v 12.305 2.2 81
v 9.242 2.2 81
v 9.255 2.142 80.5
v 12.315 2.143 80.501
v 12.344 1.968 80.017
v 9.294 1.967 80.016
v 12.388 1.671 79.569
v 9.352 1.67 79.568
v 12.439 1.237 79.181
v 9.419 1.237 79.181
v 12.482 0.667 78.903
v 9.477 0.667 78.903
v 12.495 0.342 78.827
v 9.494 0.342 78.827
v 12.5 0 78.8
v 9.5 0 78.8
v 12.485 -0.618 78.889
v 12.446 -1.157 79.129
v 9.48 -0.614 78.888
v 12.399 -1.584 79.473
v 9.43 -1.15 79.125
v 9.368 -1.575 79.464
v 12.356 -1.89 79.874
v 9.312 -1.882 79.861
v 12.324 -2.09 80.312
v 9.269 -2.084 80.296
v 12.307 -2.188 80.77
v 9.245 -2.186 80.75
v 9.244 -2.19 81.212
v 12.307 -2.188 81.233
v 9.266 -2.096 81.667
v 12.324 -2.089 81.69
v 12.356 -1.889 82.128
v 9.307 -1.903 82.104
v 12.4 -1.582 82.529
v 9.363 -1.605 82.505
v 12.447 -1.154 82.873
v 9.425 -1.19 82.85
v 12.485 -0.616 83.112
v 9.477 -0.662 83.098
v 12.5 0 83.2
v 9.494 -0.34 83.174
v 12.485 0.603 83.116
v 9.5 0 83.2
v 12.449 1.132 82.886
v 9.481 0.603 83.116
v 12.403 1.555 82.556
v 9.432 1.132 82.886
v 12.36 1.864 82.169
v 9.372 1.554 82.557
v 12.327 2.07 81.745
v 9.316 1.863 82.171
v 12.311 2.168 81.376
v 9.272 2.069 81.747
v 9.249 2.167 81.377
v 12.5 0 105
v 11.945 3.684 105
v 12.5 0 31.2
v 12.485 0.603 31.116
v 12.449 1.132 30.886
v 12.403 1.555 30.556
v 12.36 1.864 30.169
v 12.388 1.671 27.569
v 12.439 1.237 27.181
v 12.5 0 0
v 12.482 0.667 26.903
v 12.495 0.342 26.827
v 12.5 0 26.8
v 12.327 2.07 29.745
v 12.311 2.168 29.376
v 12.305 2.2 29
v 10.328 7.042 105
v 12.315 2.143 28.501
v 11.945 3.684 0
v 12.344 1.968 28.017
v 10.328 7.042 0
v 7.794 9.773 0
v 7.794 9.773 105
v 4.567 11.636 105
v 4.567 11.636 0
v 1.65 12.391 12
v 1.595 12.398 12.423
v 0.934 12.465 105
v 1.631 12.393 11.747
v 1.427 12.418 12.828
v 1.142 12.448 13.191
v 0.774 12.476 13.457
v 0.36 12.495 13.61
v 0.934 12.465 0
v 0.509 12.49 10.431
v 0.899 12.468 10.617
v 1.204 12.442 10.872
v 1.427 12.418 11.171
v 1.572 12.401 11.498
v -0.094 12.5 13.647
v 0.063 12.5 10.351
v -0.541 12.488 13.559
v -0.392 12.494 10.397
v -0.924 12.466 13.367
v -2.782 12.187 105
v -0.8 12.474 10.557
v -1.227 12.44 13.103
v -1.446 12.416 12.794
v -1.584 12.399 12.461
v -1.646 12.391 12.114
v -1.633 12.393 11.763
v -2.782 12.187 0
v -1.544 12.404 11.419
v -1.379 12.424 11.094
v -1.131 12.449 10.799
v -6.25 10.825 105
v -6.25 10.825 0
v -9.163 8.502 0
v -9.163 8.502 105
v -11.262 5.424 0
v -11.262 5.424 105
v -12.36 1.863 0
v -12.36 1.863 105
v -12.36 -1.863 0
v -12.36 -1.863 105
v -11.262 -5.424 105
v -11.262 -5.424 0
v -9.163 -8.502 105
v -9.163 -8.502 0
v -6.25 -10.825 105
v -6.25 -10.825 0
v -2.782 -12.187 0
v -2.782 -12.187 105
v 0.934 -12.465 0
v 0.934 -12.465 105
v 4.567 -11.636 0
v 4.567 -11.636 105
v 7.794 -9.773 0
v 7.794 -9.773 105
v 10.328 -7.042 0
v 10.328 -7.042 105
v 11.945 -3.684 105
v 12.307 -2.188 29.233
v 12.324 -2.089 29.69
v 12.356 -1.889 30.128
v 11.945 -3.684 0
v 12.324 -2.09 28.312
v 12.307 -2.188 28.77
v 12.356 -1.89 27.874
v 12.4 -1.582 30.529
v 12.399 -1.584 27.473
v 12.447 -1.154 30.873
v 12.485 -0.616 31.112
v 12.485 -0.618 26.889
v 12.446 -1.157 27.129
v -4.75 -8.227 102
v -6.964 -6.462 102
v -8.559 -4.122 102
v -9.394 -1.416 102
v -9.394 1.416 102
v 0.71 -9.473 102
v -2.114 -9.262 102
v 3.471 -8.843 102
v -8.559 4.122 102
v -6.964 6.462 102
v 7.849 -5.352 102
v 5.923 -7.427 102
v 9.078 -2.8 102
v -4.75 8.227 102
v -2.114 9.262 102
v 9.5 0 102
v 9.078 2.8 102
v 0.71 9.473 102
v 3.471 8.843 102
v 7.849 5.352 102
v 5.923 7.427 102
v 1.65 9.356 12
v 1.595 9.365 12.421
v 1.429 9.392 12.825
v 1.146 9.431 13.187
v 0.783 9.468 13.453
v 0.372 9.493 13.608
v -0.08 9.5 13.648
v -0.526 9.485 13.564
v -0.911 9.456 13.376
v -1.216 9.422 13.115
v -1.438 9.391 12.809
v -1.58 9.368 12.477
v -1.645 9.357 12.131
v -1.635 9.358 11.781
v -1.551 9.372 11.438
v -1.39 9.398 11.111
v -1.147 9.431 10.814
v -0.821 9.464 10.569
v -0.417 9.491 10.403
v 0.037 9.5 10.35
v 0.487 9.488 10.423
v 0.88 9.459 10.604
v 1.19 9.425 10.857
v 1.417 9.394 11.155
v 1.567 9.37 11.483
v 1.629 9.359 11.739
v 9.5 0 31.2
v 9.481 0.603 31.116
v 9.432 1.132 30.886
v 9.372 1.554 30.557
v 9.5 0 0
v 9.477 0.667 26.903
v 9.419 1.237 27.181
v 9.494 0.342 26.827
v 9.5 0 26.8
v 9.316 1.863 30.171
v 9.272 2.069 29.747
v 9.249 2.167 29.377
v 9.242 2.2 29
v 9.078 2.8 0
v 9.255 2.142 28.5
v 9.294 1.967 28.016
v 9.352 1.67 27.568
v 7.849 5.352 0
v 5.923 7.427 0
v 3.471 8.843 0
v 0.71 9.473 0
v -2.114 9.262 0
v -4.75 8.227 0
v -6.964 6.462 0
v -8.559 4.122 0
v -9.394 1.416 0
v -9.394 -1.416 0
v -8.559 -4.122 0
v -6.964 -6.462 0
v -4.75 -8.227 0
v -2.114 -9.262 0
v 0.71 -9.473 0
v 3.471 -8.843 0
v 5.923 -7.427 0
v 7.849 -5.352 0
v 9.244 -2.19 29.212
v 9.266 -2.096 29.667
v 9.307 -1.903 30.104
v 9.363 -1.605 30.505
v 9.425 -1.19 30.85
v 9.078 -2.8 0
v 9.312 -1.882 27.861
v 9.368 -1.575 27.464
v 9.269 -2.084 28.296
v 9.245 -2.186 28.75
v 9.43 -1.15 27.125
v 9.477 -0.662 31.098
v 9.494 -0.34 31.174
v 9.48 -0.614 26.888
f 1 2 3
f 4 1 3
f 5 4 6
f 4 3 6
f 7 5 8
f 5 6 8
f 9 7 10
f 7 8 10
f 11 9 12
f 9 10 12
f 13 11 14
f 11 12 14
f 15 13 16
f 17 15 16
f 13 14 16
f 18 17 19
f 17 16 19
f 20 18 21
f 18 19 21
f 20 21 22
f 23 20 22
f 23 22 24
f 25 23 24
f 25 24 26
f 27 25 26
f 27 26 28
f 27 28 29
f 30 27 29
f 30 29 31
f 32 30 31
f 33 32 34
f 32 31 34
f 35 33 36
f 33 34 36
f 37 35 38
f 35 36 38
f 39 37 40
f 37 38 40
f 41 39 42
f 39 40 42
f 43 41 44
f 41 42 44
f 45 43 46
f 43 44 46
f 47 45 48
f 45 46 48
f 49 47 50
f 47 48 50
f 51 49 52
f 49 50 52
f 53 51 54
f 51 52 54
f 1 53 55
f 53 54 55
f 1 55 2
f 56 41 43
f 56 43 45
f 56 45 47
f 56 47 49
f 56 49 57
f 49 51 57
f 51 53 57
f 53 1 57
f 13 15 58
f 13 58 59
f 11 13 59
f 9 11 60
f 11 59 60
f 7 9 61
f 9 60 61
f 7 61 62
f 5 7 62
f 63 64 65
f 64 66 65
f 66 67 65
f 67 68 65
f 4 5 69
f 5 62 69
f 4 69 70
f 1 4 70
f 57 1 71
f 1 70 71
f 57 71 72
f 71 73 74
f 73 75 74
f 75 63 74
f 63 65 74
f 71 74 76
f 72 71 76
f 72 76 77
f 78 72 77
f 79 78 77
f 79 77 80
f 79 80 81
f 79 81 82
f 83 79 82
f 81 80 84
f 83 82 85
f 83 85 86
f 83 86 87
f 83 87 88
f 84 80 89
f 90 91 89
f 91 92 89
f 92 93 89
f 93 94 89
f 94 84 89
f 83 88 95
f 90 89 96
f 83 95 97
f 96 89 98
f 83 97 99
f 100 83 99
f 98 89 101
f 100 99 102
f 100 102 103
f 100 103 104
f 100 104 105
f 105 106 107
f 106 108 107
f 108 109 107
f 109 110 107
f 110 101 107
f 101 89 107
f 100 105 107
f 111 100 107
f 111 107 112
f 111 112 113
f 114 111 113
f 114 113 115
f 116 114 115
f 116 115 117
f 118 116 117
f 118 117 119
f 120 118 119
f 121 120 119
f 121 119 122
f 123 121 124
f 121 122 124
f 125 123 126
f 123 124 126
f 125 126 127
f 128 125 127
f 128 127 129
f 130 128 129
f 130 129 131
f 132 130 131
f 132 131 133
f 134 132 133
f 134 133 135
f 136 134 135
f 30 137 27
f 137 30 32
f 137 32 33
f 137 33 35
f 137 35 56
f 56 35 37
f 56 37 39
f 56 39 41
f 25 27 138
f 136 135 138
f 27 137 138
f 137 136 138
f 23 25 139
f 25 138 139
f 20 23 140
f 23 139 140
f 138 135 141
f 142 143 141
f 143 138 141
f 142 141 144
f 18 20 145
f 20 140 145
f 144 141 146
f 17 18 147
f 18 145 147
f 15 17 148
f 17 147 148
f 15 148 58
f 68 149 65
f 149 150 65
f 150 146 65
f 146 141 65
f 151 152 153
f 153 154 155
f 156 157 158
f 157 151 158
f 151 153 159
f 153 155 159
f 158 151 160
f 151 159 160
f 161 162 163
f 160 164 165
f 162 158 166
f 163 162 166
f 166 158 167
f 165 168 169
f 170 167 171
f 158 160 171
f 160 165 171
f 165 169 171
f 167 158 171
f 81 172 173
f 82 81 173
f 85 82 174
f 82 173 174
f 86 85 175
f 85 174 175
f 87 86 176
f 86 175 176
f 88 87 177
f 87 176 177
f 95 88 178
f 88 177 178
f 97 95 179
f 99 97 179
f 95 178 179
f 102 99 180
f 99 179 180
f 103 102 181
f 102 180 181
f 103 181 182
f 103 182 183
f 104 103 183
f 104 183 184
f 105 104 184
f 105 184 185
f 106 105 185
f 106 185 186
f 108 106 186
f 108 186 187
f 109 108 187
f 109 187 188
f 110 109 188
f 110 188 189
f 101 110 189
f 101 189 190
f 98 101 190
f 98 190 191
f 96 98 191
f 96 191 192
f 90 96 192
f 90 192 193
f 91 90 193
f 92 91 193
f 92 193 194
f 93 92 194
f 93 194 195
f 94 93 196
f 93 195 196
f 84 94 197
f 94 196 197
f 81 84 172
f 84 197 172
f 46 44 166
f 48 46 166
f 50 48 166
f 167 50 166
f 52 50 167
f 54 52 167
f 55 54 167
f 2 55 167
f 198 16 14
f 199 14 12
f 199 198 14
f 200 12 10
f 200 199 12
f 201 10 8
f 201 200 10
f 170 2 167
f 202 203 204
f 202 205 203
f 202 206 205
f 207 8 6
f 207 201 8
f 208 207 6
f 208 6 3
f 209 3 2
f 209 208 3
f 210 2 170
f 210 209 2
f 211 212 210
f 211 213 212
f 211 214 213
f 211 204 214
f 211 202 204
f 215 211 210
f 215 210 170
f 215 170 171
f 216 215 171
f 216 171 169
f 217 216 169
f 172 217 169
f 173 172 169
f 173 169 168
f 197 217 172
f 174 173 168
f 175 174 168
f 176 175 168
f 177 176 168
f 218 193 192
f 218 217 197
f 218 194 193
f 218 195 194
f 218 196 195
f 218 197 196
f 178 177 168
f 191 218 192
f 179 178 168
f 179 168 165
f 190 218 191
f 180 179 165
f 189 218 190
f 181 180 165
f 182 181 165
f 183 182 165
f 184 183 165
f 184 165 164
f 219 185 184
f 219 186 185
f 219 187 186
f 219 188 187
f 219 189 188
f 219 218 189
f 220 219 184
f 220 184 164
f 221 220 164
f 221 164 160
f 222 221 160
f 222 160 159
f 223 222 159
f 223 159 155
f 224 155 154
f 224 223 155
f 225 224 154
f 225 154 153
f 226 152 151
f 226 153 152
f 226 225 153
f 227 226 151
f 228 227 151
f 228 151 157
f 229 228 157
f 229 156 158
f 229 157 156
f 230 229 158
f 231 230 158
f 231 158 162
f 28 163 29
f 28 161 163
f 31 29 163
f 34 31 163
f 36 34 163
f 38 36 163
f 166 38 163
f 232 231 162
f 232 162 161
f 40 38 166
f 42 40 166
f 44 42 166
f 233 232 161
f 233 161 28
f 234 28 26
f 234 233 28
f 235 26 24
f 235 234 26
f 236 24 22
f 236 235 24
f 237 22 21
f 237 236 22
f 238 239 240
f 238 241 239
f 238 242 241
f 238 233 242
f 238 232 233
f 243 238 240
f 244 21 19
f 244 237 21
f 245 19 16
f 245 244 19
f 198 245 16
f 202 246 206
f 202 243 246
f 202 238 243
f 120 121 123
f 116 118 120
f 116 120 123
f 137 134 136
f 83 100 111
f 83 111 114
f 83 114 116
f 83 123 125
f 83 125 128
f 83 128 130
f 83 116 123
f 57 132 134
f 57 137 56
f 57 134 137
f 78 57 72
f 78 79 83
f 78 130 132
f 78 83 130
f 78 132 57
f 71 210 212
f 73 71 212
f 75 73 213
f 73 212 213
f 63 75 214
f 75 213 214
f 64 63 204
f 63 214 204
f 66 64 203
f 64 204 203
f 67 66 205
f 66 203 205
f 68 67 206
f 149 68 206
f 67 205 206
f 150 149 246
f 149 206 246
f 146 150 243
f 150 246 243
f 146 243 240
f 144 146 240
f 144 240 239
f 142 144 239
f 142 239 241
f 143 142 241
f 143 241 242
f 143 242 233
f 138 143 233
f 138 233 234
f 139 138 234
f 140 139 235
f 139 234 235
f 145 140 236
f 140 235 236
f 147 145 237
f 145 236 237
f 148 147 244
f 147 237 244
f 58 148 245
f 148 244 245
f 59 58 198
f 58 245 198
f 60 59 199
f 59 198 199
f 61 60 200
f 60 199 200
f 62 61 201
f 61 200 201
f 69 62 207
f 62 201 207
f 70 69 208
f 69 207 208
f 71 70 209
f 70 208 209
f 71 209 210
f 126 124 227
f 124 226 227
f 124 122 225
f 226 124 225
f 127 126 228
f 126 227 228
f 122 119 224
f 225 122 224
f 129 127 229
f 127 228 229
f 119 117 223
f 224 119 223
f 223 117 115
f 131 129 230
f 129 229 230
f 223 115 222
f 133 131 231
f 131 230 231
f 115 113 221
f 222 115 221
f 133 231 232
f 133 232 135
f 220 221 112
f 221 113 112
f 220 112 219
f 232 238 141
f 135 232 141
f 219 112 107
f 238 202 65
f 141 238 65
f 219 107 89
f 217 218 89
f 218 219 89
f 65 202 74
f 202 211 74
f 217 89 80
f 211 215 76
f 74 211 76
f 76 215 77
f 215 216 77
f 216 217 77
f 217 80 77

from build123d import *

# Parameters (mm, degrees)
F0_R     = 12.5
F0_R_2   = 9.5
F1_DEPTH = 105
F2_R     = 12.5
F3_DEPTH = 3
F5_D     = 3.3
F5_DEPTH = 22.1
F5_TIP   = 0.9914200214
F7_D     = 4.4
F7_DEPTH = 22.1
F7_TIP   = 1.3218933619


with BuildPart() as f1:
    # F0 (on Top) → F1 (new body)
    with BuildSketch(Plane.XY):
        Circle(F0_R)
        Circle(F0_R_2, mode=Mode.SUBTRACT)
    extrude(amount=F1_DEPTH)

    # F2 (on face) → F3 (join)
    with BuildSketch(Plane.XY.offset(105)):
        Circle(F2_R)
    extrude(amount=-F3_DEPTH)

    # F5 (one way)
    with BuildSketch(Plane.XZ):
        with Locations((0, 12)):
            Circle(F5_D / 2)
    extrude(amount=-F5_DEPTH, mode=Mode.SUBTRACT)
    with Locations(Plane.XZ):
        with Locations((0, 12)):
            with Locations((0, 0, -(F5_DEPTH + F5_TIP / 2))):  # 118° drill point
                Cone(0, F5_D / 2, F5_TIP, mode=Mode.SUBTRACT)

    # F7 (one way)
    with BuildSketch(Plane(origin=(0, 0, 0), x_dir=(0, 1, 0), z_dir=(-1, 0, 0))):
        with Locations((0, -81), (0, -29)):
            Circle(F7_D / 2)
    extrude(amount=-F7_DEPTH, mode=Mode.SUBTRACT)
    with Locations(Plane(origin=(0, 0, 0), x_dir=(0, 1, 0), z_dir=(-1, 0, 0))):
        with Locations((0, -81), (0, -29)):
            with Locations((0, 0, -(F7_DEPTH + F7_TIP / 2))):  # 118° drill point
                Cone(0, F7_D / 2, F7_TIP, mode=Mode.SUBTRACT)


solid = f1.part
